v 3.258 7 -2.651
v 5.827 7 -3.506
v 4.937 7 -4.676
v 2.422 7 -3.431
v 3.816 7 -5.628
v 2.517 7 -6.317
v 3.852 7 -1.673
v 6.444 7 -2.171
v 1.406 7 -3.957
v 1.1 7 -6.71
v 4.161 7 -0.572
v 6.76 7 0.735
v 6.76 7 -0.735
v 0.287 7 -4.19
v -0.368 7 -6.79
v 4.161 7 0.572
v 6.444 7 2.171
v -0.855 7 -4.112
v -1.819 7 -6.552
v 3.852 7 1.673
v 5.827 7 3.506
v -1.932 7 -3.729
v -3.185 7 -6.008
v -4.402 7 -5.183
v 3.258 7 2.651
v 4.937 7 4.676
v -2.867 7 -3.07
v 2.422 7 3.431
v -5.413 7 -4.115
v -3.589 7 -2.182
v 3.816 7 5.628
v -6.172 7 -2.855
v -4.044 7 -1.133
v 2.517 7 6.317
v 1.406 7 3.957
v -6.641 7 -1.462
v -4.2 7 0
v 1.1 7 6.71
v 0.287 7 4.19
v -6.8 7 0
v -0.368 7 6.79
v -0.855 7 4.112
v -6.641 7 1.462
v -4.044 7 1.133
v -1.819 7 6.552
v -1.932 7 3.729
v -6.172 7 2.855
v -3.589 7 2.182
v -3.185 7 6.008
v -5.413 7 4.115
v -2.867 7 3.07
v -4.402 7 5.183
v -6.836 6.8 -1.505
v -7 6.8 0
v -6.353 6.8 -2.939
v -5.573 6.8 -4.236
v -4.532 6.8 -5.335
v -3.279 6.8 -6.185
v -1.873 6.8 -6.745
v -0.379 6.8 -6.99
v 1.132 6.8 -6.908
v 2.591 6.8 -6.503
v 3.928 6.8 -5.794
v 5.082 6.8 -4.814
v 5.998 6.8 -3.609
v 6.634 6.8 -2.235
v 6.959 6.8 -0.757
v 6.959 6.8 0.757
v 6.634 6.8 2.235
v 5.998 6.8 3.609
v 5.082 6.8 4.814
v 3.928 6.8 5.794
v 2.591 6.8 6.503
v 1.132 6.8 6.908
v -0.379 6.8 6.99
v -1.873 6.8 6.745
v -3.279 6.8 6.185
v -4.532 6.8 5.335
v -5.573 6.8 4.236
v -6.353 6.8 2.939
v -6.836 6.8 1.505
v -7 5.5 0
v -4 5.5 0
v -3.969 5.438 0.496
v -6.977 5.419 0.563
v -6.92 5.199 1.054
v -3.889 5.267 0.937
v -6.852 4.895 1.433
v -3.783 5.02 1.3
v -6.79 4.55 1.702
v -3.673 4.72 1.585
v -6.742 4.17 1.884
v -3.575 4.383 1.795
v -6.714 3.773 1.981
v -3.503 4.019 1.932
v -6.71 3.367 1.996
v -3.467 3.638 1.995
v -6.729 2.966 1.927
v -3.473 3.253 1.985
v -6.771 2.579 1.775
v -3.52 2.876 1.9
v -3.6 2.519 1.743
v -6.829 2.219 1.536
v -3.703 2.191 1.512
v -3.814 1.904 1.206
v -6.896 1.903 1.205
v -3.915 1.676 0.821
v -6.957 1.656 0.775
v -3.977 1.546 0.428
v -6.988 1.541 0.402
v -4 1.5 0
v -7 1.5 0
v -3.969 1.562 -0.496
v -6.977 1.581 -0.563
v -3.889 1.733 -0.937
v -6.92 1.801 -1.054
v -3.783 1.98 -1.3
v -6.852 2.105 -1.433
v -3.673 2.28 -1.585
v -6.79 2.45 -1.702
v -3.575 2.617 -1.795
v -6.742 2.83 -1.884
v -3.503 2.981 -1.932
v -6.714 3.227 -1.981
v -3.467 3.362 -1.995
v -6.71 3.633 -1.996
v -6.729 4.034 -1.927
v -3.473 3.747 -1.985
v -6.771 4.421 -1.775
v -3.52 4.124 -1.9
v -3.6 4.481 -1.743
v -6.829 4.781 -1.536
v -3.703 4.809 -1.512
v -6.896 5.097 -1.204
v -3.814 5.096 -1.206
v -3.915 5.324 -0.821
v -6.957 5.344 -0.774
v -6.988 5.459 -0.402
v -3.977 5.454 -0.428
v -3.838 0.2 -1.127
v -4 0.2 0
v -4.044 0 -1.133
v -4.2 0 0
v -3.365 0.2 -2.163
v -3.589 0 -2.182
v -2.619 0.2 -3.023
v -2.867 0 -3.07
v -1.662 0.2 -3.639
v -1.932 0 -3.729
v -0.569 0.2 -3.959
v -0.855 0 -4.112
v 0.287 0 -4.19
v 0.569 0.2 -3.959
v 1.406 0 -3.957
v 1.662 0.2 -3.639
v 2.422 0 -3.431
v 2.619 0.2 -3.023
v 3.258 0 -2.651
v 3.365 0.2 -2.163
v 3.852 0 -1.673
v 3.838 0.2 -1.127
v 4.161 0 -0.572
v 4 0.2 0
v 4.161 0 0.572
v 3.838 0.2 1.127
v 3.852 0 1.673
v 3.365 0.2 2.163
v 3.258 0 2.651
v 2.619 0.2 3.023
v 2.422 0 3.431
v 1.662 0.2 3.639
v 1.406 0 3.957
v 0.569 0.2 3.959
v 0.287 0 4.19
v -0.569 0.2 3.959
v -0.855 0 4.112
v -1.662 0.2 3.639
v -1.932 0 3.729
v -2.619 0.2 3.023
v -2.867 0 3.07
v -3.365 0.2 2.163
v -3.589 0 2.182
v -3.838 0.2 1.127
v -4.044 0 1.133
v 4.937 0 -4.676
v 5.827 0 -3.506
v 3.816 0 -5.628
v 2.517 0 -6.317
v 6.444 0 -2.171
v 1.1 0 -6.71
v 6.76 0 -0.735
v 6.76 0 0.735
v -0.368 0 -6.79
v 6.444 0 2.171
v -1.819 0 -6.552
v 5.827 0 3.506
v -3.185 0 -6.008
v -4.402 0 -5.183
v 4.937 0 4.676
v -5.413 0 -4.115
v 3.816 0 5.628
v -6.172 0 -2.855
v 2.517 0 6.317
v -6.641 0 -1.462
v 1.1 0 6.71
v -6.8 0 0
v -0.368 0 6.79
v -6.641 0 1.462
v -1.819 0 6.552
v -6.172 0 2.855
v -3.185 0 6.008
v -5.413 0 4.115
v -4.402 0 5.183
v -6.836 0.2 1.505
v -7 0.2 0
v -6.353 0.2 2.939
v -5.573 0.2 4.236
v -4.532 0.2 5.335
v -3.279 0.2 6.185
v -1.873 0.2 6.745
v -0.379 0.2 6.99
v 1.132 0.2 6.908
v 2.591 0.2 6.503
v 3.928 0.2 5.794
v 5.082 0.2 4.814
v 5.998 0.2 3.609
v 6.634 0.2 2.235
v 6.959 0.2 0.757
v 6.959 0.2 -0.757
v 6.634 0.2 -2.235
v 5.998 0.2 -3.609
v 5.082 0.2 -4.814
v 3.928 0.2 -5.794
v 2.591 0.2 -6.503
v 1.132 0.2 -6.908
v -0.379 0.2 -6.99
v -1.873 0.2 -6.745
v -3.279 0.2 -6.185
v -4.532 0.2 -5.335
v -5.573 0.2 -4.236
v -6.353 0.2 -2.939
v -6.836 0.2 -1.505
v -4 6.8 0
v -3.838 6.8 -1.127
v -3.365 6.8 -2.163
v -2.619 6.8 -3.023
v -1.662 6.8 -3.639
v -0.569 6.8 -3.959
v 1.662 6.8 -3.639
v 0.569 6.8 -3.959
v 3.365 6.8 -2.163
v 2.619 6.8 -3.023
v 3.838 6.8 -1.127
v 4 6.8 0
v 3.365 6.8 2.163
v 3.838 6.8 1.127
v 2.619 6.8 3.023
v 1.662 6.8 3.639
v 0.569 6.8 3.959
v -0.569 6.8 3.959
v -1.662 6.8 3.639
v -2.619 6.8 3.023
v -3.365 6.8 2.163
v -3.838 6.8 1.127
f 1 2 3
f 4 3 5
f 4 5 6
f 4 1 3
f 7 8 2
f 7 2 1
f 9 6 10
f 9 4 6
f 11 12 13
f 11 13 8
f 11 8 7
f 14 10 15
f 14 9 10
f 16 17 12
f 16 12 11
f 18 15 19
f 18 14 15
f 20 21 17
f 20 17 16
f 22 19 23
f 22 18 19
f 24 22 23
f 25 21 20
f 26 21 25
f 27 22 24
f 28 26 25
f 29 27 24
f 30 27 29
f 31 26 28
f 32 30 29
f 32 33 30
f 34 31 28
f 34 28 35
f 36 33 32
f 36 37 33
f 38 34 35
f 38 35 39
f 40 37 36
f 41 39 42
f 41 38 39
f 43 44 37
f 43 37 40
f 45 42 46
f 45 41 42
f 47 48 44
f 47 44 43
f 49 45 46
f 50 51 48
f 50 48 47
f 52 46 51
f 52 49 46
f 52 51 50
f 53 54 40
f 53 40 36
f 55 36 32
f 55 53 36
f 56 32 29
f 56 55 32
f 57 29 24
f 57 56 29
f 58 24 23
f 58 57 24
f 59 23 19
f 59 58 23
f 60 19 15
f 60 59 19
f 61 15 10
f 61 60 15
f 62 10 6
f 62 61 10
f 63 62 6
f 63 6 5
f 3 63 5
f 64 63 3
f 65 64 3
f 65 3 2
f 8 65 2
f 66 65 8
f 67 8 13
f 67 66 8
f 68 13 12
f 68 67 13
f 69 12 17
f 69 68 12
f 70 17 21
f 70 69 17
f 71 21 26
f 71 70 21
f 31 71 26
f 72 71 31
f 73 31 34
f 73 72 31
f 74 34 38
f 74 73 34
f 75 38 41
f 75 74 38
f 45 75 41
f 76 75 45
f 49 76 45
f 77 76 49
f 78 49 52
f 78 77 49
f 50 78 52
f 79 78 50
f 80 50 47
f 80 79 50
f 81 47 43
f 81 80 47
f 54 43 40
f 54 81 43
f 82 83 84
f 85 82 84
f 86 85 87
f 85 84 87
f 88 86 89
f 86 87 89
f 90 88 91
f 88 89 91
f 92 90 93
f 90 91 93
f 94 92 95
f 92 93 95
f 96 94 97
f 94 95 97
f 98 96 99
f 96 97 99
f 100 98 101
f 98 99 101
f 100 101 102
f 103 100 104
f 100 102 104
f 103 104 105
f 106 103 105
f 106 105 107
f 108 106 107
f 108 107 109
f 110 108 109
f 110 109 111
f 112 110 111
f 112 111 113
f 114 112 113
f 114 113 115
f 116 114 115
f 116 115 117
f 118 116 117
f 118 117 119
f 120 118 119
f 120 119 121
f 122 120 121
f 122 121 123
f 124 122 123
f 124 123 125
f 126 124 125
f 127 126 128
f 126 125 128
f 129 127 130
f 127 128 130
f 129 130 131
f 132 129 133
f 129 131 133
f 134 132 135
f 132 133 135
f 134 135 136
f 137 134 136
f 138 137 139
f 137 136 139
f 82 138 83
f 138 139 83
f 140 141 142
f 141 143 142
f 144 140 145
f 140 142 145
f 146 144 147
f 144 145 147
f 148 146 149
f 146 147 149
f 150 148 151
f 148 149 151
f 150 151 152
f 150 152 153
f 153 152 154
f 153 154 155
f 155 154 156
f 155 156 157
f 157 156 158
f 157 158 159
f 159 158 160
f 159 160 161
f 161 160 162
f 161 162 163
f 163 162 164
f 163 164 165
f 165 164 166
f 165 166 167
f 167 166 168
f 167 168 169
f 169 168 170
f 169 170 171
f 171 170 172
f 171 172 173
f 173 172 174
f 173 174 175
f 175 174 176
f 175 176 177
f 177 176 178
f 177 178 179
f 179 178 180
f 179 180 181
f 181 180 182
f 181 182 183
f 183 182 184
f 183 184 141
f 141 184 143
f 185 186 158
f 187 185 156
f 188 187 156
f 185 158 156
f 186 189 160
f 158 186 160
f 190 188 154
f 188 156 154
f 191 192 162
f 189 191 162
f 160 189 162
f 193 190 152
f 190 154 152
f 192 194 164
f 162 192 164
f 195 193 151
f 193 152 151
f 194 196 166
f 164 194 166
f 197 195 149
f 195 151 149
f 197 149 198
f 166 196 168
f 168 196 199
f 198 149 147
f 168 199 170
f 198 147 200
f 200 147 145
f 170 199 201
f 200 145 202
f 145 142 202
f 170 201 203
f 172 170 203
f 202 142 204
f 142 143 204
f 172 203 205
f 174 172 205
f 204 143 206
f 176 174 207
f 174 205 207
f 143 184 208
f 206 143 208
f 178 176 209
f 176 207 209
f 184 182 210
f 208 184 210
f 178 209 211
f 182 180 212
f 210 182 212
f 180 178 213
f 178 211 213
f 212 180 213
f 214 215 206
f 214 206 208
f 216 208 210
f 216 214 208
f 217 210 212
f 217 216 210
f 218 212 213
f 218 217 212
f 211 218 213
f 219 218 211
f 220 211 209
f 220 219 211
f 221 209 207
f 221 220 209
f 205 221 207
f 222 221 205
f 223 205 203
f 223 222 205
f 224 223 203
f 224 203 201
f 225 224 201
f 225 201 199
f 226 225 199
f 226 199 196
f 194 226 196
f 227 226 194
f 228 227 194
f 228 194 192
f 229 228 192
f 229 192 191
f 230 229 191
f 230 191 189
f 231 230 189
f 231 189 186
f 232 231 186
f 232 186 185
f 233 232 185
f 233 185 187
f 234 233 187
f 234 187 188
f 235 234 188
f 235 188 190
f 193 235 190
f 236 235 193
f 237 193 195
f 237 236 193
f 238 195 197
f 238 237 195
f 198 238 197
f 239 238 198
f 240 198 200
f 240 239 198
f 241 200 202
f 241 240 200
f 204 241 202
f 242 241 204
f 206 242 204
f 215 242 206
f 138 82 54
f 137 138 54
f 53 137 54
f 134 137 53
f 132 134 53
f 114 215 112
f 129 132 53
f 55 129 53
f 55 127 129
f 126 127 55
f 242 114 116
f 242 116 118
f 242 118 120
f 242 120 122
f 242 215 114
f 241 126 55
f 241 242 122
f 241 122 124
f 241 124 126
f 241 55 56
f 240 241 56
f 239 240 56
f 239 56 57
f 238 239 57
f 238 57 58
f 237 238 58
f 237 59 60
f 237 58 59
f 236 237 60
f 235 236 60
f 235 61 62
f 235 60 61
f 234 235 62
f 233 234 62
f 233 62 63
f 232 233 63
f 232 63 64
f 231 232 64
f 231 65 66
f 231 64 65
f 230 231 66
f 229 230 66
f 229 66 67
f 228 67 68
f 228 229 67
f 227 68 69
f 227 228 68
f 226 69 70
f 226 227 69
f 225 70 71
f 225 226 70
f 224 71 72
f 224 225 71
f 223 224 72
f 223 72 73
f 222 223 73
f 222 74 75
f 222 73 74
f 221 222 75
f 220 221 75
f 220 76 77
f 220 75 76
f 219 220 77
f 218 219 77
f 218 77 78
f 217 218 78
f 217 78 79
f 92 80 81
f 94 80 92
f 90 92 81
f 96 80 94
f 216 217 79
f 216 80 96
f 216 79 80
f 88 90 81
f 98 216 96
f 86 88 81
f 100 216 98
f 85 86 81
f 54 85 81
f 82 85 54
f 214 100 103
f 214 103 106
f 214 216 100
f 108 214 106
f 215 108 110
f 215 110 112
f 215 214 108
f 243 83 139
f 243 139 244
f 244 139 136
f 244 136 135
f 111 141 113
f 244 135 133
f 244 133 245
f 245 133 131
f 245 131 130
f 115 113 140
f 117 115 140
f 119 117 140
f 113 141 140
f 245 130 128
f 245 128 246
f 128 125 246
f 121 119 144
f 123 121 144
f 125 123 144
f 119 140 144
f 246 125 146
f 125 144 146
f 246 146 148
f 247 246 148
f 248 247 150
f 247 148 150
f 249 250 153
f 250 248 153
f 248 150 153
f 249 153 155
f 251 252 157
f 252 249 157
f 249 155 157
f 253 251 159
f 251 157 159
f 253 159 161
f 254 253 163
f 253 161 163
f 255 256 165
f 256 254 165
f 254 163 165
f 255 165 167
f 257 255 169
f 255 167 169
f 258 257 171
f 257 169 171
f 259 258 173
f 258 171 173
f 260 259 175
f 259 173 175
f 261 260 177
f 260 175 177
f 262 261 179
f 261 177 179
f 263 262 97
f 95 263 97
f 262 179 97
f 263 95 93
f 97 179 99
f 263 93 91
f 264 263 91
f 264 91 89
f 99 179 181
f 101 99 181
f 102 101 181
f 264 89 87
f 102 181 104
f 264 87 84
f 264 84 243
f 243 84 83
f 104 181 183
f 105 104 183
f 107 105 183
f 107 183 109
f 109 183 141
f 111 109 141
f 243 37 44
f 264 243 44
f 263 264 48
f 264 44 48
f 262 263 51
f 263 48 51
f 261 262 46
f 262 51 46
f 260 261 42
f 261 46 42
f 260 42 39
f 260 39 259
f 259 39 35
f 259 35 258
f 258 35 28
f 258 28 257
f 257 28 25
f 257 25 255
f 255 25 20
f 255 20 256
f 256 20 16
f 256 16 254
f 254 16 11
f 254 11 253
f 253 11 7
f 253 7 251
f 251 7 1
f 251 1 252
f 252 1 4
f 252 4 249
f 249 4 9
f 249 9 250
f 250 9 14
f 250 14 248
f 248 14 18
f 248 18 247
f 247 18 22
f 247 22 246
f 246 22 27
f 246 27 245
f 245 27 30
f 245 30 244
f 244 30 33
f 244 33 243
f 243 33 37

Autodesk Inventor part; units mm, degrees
ref_plane "YZ Plane" through (0, 0, 0) normal (1, 0, 0) x (0, 1, 0)
ref_plane "XZ Plane" through (0, 0, 0) normal (0, 1, 0) x (-1, 0, 0)
ref_plane "XY Plane" through (0, 0, 0) normal (0, 0, 1) x (1, 0, 0)
sketch "Sketch1" plane through (0, 0, 0) normal (0, 1, 0) x (-1, 0, 0)
  circle A0 centre (0, 0) radius 7
  circle A1 centre (0, 0) radius 4
  dimension "d0" = 14
  dimension "d1" = 8
extrude "Extrusion1" add sketch "Sketch1" along normal blind 7
chamfer "Chamfer1" distance 0.2 angle 45 4 edges at (7, 7, 0) (4, 7, 0) (7, 0, 0) (4, 0, 0)
sketch "Sketch2" plane through (0, 0, 0) normal (0, 1, 0) x (-1, 0, 0)
  point P0 (0, 0)
sketch "Sketch3" plane through (0, 0, 0) normal (1, 0, 0) x (0, 1, 0)
  circle A0 centre (3.5, 0) radius 2
  line L0 (7, -4.2) -> (7, 4.2) projected
  point P0 (0, 0)
  dimension "d7" = 4
  dimension "d8" = 3.5
extrude "Extrusion2" cut sketch "Sketch3" against normal blind 7
properties part number "8mmShaftCollar"
